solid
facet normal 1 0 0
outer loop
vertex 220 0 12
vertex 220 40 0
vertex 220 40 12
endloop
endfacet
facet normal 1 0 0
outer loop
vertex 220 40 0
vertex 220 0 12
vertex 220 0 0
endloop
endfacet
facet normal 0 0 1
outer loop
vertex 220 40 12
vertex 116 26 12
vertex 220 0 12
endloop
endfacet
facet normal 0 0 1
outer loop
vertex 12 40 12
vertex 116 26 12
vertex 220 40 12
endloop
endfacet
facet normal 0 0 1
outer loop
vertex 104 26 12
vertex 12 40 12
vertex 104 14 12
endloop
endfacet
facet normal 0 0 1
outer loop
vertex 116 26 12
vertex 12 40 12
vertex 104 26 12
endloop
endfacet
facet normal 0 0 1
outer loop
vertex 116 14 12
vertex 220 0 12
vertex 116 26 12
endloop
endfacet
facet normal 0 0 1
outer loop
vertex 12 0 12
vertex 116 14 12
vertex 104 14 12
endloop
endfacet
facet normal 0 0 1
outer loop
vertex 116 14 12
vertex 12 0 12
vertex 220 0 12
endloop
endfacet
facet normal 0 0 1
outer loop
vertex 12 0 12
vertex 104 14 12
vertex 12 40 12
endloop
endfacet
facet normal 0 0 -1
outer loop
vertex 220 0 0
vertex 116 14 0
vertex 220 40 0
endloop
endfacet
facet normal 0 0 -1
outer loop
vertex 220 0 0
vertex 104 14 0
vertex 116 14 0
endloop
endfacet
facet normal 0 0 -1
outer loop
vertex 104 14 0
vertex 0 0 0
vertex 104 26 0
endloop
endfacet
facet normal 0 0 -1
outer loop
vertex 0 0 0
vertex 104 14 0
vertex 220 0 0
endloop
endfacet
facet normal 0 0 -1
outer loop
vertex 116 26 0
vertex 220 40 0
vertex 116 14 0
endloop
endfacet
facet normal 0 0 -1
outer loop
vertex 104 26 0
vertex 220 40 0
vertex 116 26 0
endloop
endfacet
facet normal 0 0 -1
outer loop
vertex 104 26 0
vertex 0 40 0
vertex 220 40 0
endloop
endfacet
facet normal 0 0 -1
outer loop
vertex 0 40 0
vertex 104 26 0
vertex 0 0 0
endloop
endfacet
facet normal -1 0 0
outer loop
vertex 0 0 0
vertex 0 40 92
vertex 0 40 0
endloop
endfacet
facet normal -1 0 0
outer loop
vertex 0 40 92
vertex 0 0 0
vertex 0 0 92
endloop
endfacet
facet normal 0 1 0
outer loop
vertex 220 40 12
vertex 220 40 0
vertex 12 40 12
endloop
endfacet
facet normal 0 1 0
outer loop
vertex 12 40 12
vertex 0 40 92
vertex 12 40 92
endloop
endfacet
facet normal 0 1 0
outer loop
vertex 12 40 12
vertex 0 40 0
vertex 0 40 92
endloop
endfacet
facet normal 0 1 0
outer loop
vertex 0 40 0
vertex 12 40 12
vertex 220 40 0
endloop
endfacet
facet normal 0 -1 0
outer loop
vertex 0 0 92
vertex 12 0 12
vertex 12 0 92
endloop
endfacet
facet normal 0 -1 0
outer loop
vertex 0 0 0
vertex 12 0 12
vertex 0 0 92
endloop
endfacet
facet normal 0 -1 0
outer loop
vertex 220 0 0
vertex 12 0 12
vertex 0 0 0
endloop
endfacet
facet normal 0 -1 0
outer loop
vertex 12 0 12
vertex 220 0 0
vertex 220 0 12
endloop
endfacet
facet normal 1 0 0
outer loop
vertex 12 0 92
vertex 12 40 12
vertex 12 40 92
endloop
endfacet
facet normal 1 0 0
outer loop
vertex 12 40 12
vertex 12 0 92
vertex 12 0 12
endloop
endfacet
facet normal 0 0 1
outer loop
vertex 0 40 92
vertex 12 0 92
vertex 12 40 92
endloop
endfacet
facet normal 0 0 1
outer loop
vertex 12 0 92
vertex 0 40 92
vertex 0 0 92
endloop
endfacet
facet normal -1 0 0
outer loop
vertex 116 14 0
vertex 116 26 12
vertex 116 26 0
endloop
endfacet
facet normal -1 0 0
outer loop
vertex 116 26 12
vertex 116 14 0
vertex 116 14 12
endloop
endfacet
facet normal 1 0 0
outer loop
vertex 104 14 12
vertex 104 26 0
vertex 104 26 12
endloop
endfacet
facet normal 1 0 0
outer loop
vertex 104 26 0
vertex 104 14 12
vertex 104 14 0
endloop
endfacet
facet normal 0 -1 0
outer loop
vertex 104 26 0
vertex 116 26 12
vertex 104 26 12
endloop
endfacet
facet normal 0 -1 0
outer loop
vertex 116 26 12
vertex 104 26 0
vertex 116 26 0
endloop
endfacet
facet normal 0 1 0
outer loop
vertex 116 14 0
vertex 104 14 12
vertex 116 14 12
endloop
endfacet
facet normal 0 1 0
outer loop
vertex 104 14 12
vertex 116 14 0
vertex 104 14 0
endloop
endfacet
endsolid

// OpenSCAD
$fn = 32;

// ----------------------------------------------------------------------
// Gantry bracket: 200-250 mm L bracket
// ----------------------------------------------------------------------

// --- parameters (mm) ---
base_l = 220;             // base arm length, X
arm_w = 40;               // arm width, Y
thick = 12;               // arm thickness
up_h = 80;                // vertical arm height, Z
slot_w = 12;              // adjustment slot width in the base

total_h = up_h + thick;  // overall height

difference() {
  union() {
    cube([base_l, arm_w, thick]);
    cube([thick, arm_w, total_h]);
  }
  translate([base_l / 2 - slot_w / 2, arm_w / 2 - slot_w / 2, -1])
    cube([slot_w, slot_w, thick + 2]);
}
